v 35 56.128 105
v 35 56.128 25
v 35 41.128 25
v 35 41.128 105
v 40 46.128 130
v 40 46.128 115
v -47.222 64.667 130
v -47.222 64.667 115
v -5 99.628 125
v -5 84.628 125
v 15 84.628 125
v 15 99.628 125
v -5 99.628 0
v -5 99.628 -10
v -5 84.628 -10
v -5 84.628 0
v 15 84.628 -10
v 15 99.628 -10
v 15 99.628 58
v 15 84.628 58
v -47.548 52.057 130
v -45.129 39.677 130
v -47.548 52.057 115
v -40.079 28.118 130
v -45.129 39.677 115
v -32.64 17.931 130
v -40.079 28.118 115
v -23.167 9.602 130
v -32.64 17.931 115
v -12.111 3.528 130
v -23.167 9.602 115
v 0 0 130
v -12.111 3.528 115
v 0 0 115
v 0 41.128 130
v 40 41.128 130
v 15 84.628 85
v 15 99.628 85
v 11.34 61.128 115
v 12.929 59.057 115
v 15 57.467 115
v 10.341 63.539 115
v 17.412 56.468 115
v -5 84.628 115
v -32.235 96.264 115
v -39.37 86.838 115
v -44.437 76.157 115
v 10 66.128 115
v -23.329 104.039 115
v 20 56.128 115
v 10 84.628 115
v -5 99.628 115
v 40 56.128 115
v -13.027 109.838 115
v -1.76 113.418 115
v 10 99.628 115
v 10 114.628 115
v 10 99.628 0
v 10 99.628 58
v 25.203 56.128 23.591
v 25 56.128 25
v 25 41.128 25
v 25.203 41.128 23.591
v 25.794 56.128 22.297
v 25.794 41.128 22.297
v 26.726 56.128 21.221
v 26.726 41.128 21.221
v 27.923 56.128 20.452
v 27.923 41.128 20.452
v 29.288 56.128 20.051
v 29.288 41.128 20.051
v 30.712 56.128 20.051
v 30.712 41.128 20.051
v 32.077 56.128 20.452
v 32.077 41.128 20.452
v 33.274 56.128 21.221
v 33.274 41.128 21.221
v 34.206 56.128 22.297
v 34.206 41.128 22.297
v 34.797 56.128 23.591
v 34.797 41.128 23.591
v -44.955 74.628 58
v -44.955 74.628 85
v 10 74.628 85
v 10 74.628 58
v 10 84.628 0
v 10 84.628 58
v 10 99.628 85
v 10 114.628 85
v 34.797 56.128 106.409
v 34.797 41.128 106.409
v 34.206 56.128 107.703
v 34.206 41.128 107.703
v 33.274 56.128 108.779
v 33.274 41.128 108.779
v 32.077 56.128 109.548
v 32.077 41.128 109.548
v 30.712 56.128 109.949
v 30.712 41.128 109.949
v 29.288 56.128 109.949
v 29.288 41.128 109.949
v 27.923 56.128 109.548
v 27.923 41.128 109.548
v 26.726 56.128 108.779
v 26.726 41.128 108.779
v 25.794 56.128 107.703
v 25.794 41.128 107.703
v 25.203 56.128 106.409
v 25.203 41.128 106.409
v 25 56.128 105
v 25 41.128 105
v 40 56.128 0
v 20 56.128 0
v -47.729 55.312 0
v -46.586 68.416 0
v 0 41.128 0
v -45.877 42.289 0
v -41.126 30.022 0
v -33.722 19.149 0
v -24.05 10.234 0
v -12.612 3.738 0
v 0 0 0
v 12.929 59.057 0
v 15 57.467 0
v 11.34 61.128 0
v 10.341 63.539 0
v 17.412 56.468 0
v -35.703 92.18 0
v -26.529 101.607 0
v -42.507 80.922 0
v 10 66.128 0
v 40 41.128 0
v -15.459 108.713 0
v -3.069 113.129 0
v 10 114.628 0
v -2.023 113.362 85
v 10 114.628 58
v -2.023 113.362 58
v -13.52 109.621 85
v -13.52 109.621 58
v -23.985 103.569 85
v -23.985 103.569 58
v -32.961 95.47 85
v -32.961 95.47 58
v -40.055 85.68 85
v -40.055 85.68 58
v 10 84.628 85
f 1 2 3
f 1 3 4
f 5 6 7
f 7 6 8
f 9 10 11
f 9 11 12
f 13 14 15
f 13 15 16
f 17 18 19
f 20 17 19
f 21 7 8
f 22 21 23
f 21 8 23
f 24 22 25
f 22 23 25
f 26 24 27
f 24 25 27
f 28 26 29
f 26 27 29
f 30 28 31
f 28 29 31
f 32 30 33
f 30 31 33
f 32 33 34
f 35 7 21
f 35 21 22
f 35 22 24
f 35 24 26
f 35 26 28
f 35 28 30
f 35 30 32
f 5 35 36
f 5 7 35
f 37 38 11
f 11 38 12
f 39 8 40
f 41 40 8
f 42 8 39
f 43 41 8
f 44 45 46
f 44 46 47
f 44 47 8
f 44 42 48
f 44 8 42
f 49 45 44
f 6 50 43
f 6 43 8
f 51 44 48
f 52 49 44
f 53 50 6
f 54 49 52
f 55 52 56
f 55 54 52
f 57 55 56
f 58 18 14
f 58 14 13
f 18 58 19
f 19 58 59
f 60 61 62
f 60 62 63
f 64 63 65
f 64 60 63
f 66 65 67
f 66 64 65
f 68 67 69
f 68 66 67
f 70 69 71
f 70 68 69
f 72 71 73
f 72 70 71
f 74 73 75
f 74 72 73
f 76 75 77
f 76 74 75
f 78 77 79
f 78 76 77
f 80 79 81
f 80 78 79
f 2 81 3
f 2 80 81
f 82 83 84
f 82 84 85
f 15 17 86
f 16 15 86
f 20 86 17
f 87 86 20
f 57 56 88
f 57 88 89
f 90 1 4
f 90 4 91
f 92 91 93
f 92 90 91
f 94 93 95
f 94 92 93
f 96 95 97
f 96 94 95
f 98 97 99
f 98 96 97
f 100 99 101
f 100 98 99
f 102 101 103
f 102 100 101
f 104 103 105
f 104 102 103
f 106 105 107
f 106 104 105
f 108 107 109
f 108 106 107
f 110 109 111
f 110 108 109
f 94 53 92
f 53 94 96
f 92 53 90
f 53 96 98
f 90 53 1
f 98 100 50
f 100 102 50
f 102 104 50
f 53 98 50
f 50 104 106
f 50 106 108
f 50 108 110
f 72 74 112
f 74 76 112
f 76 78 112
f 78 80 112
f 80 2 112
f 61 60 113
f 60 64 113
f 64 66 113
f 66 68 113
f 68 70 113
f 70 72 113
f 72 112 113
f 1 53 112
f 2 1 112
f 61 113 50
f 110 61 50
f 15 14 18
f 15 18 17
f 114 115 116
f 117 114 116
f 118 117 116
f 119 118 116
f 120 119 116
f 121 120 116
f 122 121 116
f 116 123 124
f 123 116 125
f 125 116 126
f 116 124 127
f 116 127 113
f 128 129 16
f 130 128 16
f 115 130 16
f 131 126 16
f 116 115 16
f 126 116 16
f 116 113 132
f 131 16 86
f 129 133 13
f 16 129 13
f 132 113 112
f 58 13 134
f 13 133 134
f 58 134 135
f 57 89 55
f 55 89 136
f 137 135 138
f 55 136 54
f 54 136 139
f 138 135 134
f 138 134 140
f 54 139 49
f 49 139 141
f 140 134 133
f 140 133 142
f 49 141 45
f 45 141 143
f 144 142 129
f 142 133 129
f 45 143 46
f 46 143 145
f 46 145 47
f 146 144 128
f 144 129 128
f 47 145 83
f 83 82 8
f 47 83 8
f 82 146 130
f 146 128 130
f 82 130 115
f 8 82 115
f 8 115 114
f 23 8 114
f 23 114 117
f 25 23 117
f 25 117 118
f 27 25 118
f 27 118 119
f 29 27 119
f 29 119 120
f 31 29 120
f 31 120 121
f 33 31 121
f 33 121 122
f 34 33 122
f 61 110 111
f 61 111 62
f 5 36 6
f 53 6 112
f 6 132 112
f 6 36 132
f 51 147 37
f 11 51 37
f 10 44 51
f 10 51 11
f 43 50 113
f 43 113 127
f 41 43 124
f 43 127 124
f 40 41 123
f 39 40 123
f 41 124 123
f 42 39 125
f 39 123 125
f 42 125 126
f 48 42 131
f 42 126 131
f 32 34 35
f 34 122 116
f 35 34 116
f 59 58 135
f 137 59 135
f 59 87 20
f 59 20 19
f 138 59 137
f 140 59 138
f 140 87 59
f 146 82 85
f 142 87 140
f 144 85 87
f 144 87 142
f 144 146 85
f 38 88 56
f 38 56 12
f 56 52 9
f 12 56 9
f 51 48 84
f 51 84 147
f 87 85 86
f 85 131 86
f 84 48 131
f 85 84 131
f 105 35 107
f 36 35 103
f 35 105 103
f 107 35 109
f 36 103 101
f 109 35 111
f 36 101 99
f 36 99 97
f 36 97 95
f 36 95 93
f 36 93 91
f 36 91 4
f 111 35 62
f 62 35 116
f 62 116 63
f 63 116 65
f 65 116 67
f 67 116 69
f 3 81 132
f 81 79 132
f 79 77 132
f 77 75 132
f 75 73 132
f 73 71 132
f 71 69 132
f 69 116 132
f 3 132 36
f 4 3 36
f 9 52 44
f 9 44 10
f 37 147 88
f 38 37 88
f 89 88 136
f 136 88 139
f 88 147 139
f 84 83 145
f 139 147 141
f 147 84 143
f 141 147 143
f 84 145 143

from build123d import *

# Parameters (mm, degrees)
BOSS_EXTRUDE1_DEPTH      = 115
BOSS_EXTRUDE2_DEPTH      = 5
BOSS_EXTRUDE2_DEPTH_BACK = 15
CUT_EXTRUDE1_DEPTH       = 177.194640768
CUT_EXTRUDE1_DEPTH_BACK  = 177.194640768
SKETCH8_W                = 27
SKETCH8_H                = 40
BOSS_EXTRUDE3_DEPTH      = 15
CUT_EXTRUDE2_DEPTH       = 151.340654848


with BuildPart() as part:
    # Sketch1 → Boss-Extrude1 (new body)
    with BuildSketch(Plane.XY):
        with BuildLine():
            Line((0, 0), (0, 41.12760983))
            Line((0, 41.12760983), (40, 41.12760983))
            Line((40, 41.12760983), (40, 56.12760983))
            Line((40, 56.12760983), (20, 56.12760983))
            ThreePointArc((20, 56.12760983), (12.928932188, 59.056542018), (10, 66.12760983))
            Line((10, 66.12760983), (10, 114.62760983))
            ThreePointArc((10, 114.62760983), (-47.531489063, 61.896600381), (0, 0))
        make_face()
    extrude(amount=BOSS_EXTRUDE1_DEPTH)

    # Sketch5 → Boss-Extrude2 (add, two sides: drawn at the far end of the back side and taken through both)
    with BuildSketch(Plane(origin=(10, 0, 0), x_dir=(0, 0, -1), z_dir=(1, 0, 0)).offset(-BOSS_EXTRUDE2_DEPTH_BACK)):
        Polygon((0, 99.62760983), (10, 99.62760983), (10, 84.62760983), (-125, 84.62760983), (-125, 99.62760983), align=None)
    extrude(amount=BOSS_EXTRUDE2_DEPTH + BOSS_EXTRUDE2_DEPTH_BACK)

    # Sketch8 → Cut-Extrude1 (cut, two sides: drawn at the far end of the back side and taken through both)
    with BuildSketch(Plane(origin=(0, 0, 0), x_dir=(0, 0, -1), z_dir=(1, 0, 0)).offset(-CUT_EXTRUDE1_DEPTH_BACK)):
        with Locations((-71.5, 94.62760983)):
            Rectangle(SKETCH8_W, SKETCH8_H)
    extrude(amount=CUT_EXTRUDE1_DEPTH + CUT_EXTRUDE1_DEPTH_BACK, mode=Mode.SUBTRACT)

    # Sketch9 → Boss-Extrude3 (add)
    with BuildSketch(Plane.XY.offset(115)):
        with BuildLine():
            Line((40, 46.12760983), (-47.222231128, 64.66726738))
            ThreePointArc((-47.222231128, 64.66726738), (-36.638728081, 22.82042934), (0, 0))
            Line((0, 0), (0, 41.12760983))
            Line((0, 41.12760983), (40, 41.12760983))
            Line((40, 41.12760983), (40, 46.12760983))
        make_face()
    extrude(amount=BOSS_EXTRUDE3_DEPTH)

    # Sketch10 → Cut-Extrude2 (cut, through all)
    with BuildSketch(Plane(origin=(0, 56.12760983, 0), x_dir=(1, 0, 0), z_dir=(0, 1, 0))):
        with BuildLine():
            Line((25, -105), (25, -25))
            ThreePointArc((25, -25), (30, -20), (35, -25))
            Line((35, -25), (35, -105))
            ThreePointArc((35, -105), (30, -110), (25, -105))
        make_face()
    extrude(amount=-CUT_EXTRUDE2_DEPTH, mode=Mode.SUBTRACT)


solid = part.part
